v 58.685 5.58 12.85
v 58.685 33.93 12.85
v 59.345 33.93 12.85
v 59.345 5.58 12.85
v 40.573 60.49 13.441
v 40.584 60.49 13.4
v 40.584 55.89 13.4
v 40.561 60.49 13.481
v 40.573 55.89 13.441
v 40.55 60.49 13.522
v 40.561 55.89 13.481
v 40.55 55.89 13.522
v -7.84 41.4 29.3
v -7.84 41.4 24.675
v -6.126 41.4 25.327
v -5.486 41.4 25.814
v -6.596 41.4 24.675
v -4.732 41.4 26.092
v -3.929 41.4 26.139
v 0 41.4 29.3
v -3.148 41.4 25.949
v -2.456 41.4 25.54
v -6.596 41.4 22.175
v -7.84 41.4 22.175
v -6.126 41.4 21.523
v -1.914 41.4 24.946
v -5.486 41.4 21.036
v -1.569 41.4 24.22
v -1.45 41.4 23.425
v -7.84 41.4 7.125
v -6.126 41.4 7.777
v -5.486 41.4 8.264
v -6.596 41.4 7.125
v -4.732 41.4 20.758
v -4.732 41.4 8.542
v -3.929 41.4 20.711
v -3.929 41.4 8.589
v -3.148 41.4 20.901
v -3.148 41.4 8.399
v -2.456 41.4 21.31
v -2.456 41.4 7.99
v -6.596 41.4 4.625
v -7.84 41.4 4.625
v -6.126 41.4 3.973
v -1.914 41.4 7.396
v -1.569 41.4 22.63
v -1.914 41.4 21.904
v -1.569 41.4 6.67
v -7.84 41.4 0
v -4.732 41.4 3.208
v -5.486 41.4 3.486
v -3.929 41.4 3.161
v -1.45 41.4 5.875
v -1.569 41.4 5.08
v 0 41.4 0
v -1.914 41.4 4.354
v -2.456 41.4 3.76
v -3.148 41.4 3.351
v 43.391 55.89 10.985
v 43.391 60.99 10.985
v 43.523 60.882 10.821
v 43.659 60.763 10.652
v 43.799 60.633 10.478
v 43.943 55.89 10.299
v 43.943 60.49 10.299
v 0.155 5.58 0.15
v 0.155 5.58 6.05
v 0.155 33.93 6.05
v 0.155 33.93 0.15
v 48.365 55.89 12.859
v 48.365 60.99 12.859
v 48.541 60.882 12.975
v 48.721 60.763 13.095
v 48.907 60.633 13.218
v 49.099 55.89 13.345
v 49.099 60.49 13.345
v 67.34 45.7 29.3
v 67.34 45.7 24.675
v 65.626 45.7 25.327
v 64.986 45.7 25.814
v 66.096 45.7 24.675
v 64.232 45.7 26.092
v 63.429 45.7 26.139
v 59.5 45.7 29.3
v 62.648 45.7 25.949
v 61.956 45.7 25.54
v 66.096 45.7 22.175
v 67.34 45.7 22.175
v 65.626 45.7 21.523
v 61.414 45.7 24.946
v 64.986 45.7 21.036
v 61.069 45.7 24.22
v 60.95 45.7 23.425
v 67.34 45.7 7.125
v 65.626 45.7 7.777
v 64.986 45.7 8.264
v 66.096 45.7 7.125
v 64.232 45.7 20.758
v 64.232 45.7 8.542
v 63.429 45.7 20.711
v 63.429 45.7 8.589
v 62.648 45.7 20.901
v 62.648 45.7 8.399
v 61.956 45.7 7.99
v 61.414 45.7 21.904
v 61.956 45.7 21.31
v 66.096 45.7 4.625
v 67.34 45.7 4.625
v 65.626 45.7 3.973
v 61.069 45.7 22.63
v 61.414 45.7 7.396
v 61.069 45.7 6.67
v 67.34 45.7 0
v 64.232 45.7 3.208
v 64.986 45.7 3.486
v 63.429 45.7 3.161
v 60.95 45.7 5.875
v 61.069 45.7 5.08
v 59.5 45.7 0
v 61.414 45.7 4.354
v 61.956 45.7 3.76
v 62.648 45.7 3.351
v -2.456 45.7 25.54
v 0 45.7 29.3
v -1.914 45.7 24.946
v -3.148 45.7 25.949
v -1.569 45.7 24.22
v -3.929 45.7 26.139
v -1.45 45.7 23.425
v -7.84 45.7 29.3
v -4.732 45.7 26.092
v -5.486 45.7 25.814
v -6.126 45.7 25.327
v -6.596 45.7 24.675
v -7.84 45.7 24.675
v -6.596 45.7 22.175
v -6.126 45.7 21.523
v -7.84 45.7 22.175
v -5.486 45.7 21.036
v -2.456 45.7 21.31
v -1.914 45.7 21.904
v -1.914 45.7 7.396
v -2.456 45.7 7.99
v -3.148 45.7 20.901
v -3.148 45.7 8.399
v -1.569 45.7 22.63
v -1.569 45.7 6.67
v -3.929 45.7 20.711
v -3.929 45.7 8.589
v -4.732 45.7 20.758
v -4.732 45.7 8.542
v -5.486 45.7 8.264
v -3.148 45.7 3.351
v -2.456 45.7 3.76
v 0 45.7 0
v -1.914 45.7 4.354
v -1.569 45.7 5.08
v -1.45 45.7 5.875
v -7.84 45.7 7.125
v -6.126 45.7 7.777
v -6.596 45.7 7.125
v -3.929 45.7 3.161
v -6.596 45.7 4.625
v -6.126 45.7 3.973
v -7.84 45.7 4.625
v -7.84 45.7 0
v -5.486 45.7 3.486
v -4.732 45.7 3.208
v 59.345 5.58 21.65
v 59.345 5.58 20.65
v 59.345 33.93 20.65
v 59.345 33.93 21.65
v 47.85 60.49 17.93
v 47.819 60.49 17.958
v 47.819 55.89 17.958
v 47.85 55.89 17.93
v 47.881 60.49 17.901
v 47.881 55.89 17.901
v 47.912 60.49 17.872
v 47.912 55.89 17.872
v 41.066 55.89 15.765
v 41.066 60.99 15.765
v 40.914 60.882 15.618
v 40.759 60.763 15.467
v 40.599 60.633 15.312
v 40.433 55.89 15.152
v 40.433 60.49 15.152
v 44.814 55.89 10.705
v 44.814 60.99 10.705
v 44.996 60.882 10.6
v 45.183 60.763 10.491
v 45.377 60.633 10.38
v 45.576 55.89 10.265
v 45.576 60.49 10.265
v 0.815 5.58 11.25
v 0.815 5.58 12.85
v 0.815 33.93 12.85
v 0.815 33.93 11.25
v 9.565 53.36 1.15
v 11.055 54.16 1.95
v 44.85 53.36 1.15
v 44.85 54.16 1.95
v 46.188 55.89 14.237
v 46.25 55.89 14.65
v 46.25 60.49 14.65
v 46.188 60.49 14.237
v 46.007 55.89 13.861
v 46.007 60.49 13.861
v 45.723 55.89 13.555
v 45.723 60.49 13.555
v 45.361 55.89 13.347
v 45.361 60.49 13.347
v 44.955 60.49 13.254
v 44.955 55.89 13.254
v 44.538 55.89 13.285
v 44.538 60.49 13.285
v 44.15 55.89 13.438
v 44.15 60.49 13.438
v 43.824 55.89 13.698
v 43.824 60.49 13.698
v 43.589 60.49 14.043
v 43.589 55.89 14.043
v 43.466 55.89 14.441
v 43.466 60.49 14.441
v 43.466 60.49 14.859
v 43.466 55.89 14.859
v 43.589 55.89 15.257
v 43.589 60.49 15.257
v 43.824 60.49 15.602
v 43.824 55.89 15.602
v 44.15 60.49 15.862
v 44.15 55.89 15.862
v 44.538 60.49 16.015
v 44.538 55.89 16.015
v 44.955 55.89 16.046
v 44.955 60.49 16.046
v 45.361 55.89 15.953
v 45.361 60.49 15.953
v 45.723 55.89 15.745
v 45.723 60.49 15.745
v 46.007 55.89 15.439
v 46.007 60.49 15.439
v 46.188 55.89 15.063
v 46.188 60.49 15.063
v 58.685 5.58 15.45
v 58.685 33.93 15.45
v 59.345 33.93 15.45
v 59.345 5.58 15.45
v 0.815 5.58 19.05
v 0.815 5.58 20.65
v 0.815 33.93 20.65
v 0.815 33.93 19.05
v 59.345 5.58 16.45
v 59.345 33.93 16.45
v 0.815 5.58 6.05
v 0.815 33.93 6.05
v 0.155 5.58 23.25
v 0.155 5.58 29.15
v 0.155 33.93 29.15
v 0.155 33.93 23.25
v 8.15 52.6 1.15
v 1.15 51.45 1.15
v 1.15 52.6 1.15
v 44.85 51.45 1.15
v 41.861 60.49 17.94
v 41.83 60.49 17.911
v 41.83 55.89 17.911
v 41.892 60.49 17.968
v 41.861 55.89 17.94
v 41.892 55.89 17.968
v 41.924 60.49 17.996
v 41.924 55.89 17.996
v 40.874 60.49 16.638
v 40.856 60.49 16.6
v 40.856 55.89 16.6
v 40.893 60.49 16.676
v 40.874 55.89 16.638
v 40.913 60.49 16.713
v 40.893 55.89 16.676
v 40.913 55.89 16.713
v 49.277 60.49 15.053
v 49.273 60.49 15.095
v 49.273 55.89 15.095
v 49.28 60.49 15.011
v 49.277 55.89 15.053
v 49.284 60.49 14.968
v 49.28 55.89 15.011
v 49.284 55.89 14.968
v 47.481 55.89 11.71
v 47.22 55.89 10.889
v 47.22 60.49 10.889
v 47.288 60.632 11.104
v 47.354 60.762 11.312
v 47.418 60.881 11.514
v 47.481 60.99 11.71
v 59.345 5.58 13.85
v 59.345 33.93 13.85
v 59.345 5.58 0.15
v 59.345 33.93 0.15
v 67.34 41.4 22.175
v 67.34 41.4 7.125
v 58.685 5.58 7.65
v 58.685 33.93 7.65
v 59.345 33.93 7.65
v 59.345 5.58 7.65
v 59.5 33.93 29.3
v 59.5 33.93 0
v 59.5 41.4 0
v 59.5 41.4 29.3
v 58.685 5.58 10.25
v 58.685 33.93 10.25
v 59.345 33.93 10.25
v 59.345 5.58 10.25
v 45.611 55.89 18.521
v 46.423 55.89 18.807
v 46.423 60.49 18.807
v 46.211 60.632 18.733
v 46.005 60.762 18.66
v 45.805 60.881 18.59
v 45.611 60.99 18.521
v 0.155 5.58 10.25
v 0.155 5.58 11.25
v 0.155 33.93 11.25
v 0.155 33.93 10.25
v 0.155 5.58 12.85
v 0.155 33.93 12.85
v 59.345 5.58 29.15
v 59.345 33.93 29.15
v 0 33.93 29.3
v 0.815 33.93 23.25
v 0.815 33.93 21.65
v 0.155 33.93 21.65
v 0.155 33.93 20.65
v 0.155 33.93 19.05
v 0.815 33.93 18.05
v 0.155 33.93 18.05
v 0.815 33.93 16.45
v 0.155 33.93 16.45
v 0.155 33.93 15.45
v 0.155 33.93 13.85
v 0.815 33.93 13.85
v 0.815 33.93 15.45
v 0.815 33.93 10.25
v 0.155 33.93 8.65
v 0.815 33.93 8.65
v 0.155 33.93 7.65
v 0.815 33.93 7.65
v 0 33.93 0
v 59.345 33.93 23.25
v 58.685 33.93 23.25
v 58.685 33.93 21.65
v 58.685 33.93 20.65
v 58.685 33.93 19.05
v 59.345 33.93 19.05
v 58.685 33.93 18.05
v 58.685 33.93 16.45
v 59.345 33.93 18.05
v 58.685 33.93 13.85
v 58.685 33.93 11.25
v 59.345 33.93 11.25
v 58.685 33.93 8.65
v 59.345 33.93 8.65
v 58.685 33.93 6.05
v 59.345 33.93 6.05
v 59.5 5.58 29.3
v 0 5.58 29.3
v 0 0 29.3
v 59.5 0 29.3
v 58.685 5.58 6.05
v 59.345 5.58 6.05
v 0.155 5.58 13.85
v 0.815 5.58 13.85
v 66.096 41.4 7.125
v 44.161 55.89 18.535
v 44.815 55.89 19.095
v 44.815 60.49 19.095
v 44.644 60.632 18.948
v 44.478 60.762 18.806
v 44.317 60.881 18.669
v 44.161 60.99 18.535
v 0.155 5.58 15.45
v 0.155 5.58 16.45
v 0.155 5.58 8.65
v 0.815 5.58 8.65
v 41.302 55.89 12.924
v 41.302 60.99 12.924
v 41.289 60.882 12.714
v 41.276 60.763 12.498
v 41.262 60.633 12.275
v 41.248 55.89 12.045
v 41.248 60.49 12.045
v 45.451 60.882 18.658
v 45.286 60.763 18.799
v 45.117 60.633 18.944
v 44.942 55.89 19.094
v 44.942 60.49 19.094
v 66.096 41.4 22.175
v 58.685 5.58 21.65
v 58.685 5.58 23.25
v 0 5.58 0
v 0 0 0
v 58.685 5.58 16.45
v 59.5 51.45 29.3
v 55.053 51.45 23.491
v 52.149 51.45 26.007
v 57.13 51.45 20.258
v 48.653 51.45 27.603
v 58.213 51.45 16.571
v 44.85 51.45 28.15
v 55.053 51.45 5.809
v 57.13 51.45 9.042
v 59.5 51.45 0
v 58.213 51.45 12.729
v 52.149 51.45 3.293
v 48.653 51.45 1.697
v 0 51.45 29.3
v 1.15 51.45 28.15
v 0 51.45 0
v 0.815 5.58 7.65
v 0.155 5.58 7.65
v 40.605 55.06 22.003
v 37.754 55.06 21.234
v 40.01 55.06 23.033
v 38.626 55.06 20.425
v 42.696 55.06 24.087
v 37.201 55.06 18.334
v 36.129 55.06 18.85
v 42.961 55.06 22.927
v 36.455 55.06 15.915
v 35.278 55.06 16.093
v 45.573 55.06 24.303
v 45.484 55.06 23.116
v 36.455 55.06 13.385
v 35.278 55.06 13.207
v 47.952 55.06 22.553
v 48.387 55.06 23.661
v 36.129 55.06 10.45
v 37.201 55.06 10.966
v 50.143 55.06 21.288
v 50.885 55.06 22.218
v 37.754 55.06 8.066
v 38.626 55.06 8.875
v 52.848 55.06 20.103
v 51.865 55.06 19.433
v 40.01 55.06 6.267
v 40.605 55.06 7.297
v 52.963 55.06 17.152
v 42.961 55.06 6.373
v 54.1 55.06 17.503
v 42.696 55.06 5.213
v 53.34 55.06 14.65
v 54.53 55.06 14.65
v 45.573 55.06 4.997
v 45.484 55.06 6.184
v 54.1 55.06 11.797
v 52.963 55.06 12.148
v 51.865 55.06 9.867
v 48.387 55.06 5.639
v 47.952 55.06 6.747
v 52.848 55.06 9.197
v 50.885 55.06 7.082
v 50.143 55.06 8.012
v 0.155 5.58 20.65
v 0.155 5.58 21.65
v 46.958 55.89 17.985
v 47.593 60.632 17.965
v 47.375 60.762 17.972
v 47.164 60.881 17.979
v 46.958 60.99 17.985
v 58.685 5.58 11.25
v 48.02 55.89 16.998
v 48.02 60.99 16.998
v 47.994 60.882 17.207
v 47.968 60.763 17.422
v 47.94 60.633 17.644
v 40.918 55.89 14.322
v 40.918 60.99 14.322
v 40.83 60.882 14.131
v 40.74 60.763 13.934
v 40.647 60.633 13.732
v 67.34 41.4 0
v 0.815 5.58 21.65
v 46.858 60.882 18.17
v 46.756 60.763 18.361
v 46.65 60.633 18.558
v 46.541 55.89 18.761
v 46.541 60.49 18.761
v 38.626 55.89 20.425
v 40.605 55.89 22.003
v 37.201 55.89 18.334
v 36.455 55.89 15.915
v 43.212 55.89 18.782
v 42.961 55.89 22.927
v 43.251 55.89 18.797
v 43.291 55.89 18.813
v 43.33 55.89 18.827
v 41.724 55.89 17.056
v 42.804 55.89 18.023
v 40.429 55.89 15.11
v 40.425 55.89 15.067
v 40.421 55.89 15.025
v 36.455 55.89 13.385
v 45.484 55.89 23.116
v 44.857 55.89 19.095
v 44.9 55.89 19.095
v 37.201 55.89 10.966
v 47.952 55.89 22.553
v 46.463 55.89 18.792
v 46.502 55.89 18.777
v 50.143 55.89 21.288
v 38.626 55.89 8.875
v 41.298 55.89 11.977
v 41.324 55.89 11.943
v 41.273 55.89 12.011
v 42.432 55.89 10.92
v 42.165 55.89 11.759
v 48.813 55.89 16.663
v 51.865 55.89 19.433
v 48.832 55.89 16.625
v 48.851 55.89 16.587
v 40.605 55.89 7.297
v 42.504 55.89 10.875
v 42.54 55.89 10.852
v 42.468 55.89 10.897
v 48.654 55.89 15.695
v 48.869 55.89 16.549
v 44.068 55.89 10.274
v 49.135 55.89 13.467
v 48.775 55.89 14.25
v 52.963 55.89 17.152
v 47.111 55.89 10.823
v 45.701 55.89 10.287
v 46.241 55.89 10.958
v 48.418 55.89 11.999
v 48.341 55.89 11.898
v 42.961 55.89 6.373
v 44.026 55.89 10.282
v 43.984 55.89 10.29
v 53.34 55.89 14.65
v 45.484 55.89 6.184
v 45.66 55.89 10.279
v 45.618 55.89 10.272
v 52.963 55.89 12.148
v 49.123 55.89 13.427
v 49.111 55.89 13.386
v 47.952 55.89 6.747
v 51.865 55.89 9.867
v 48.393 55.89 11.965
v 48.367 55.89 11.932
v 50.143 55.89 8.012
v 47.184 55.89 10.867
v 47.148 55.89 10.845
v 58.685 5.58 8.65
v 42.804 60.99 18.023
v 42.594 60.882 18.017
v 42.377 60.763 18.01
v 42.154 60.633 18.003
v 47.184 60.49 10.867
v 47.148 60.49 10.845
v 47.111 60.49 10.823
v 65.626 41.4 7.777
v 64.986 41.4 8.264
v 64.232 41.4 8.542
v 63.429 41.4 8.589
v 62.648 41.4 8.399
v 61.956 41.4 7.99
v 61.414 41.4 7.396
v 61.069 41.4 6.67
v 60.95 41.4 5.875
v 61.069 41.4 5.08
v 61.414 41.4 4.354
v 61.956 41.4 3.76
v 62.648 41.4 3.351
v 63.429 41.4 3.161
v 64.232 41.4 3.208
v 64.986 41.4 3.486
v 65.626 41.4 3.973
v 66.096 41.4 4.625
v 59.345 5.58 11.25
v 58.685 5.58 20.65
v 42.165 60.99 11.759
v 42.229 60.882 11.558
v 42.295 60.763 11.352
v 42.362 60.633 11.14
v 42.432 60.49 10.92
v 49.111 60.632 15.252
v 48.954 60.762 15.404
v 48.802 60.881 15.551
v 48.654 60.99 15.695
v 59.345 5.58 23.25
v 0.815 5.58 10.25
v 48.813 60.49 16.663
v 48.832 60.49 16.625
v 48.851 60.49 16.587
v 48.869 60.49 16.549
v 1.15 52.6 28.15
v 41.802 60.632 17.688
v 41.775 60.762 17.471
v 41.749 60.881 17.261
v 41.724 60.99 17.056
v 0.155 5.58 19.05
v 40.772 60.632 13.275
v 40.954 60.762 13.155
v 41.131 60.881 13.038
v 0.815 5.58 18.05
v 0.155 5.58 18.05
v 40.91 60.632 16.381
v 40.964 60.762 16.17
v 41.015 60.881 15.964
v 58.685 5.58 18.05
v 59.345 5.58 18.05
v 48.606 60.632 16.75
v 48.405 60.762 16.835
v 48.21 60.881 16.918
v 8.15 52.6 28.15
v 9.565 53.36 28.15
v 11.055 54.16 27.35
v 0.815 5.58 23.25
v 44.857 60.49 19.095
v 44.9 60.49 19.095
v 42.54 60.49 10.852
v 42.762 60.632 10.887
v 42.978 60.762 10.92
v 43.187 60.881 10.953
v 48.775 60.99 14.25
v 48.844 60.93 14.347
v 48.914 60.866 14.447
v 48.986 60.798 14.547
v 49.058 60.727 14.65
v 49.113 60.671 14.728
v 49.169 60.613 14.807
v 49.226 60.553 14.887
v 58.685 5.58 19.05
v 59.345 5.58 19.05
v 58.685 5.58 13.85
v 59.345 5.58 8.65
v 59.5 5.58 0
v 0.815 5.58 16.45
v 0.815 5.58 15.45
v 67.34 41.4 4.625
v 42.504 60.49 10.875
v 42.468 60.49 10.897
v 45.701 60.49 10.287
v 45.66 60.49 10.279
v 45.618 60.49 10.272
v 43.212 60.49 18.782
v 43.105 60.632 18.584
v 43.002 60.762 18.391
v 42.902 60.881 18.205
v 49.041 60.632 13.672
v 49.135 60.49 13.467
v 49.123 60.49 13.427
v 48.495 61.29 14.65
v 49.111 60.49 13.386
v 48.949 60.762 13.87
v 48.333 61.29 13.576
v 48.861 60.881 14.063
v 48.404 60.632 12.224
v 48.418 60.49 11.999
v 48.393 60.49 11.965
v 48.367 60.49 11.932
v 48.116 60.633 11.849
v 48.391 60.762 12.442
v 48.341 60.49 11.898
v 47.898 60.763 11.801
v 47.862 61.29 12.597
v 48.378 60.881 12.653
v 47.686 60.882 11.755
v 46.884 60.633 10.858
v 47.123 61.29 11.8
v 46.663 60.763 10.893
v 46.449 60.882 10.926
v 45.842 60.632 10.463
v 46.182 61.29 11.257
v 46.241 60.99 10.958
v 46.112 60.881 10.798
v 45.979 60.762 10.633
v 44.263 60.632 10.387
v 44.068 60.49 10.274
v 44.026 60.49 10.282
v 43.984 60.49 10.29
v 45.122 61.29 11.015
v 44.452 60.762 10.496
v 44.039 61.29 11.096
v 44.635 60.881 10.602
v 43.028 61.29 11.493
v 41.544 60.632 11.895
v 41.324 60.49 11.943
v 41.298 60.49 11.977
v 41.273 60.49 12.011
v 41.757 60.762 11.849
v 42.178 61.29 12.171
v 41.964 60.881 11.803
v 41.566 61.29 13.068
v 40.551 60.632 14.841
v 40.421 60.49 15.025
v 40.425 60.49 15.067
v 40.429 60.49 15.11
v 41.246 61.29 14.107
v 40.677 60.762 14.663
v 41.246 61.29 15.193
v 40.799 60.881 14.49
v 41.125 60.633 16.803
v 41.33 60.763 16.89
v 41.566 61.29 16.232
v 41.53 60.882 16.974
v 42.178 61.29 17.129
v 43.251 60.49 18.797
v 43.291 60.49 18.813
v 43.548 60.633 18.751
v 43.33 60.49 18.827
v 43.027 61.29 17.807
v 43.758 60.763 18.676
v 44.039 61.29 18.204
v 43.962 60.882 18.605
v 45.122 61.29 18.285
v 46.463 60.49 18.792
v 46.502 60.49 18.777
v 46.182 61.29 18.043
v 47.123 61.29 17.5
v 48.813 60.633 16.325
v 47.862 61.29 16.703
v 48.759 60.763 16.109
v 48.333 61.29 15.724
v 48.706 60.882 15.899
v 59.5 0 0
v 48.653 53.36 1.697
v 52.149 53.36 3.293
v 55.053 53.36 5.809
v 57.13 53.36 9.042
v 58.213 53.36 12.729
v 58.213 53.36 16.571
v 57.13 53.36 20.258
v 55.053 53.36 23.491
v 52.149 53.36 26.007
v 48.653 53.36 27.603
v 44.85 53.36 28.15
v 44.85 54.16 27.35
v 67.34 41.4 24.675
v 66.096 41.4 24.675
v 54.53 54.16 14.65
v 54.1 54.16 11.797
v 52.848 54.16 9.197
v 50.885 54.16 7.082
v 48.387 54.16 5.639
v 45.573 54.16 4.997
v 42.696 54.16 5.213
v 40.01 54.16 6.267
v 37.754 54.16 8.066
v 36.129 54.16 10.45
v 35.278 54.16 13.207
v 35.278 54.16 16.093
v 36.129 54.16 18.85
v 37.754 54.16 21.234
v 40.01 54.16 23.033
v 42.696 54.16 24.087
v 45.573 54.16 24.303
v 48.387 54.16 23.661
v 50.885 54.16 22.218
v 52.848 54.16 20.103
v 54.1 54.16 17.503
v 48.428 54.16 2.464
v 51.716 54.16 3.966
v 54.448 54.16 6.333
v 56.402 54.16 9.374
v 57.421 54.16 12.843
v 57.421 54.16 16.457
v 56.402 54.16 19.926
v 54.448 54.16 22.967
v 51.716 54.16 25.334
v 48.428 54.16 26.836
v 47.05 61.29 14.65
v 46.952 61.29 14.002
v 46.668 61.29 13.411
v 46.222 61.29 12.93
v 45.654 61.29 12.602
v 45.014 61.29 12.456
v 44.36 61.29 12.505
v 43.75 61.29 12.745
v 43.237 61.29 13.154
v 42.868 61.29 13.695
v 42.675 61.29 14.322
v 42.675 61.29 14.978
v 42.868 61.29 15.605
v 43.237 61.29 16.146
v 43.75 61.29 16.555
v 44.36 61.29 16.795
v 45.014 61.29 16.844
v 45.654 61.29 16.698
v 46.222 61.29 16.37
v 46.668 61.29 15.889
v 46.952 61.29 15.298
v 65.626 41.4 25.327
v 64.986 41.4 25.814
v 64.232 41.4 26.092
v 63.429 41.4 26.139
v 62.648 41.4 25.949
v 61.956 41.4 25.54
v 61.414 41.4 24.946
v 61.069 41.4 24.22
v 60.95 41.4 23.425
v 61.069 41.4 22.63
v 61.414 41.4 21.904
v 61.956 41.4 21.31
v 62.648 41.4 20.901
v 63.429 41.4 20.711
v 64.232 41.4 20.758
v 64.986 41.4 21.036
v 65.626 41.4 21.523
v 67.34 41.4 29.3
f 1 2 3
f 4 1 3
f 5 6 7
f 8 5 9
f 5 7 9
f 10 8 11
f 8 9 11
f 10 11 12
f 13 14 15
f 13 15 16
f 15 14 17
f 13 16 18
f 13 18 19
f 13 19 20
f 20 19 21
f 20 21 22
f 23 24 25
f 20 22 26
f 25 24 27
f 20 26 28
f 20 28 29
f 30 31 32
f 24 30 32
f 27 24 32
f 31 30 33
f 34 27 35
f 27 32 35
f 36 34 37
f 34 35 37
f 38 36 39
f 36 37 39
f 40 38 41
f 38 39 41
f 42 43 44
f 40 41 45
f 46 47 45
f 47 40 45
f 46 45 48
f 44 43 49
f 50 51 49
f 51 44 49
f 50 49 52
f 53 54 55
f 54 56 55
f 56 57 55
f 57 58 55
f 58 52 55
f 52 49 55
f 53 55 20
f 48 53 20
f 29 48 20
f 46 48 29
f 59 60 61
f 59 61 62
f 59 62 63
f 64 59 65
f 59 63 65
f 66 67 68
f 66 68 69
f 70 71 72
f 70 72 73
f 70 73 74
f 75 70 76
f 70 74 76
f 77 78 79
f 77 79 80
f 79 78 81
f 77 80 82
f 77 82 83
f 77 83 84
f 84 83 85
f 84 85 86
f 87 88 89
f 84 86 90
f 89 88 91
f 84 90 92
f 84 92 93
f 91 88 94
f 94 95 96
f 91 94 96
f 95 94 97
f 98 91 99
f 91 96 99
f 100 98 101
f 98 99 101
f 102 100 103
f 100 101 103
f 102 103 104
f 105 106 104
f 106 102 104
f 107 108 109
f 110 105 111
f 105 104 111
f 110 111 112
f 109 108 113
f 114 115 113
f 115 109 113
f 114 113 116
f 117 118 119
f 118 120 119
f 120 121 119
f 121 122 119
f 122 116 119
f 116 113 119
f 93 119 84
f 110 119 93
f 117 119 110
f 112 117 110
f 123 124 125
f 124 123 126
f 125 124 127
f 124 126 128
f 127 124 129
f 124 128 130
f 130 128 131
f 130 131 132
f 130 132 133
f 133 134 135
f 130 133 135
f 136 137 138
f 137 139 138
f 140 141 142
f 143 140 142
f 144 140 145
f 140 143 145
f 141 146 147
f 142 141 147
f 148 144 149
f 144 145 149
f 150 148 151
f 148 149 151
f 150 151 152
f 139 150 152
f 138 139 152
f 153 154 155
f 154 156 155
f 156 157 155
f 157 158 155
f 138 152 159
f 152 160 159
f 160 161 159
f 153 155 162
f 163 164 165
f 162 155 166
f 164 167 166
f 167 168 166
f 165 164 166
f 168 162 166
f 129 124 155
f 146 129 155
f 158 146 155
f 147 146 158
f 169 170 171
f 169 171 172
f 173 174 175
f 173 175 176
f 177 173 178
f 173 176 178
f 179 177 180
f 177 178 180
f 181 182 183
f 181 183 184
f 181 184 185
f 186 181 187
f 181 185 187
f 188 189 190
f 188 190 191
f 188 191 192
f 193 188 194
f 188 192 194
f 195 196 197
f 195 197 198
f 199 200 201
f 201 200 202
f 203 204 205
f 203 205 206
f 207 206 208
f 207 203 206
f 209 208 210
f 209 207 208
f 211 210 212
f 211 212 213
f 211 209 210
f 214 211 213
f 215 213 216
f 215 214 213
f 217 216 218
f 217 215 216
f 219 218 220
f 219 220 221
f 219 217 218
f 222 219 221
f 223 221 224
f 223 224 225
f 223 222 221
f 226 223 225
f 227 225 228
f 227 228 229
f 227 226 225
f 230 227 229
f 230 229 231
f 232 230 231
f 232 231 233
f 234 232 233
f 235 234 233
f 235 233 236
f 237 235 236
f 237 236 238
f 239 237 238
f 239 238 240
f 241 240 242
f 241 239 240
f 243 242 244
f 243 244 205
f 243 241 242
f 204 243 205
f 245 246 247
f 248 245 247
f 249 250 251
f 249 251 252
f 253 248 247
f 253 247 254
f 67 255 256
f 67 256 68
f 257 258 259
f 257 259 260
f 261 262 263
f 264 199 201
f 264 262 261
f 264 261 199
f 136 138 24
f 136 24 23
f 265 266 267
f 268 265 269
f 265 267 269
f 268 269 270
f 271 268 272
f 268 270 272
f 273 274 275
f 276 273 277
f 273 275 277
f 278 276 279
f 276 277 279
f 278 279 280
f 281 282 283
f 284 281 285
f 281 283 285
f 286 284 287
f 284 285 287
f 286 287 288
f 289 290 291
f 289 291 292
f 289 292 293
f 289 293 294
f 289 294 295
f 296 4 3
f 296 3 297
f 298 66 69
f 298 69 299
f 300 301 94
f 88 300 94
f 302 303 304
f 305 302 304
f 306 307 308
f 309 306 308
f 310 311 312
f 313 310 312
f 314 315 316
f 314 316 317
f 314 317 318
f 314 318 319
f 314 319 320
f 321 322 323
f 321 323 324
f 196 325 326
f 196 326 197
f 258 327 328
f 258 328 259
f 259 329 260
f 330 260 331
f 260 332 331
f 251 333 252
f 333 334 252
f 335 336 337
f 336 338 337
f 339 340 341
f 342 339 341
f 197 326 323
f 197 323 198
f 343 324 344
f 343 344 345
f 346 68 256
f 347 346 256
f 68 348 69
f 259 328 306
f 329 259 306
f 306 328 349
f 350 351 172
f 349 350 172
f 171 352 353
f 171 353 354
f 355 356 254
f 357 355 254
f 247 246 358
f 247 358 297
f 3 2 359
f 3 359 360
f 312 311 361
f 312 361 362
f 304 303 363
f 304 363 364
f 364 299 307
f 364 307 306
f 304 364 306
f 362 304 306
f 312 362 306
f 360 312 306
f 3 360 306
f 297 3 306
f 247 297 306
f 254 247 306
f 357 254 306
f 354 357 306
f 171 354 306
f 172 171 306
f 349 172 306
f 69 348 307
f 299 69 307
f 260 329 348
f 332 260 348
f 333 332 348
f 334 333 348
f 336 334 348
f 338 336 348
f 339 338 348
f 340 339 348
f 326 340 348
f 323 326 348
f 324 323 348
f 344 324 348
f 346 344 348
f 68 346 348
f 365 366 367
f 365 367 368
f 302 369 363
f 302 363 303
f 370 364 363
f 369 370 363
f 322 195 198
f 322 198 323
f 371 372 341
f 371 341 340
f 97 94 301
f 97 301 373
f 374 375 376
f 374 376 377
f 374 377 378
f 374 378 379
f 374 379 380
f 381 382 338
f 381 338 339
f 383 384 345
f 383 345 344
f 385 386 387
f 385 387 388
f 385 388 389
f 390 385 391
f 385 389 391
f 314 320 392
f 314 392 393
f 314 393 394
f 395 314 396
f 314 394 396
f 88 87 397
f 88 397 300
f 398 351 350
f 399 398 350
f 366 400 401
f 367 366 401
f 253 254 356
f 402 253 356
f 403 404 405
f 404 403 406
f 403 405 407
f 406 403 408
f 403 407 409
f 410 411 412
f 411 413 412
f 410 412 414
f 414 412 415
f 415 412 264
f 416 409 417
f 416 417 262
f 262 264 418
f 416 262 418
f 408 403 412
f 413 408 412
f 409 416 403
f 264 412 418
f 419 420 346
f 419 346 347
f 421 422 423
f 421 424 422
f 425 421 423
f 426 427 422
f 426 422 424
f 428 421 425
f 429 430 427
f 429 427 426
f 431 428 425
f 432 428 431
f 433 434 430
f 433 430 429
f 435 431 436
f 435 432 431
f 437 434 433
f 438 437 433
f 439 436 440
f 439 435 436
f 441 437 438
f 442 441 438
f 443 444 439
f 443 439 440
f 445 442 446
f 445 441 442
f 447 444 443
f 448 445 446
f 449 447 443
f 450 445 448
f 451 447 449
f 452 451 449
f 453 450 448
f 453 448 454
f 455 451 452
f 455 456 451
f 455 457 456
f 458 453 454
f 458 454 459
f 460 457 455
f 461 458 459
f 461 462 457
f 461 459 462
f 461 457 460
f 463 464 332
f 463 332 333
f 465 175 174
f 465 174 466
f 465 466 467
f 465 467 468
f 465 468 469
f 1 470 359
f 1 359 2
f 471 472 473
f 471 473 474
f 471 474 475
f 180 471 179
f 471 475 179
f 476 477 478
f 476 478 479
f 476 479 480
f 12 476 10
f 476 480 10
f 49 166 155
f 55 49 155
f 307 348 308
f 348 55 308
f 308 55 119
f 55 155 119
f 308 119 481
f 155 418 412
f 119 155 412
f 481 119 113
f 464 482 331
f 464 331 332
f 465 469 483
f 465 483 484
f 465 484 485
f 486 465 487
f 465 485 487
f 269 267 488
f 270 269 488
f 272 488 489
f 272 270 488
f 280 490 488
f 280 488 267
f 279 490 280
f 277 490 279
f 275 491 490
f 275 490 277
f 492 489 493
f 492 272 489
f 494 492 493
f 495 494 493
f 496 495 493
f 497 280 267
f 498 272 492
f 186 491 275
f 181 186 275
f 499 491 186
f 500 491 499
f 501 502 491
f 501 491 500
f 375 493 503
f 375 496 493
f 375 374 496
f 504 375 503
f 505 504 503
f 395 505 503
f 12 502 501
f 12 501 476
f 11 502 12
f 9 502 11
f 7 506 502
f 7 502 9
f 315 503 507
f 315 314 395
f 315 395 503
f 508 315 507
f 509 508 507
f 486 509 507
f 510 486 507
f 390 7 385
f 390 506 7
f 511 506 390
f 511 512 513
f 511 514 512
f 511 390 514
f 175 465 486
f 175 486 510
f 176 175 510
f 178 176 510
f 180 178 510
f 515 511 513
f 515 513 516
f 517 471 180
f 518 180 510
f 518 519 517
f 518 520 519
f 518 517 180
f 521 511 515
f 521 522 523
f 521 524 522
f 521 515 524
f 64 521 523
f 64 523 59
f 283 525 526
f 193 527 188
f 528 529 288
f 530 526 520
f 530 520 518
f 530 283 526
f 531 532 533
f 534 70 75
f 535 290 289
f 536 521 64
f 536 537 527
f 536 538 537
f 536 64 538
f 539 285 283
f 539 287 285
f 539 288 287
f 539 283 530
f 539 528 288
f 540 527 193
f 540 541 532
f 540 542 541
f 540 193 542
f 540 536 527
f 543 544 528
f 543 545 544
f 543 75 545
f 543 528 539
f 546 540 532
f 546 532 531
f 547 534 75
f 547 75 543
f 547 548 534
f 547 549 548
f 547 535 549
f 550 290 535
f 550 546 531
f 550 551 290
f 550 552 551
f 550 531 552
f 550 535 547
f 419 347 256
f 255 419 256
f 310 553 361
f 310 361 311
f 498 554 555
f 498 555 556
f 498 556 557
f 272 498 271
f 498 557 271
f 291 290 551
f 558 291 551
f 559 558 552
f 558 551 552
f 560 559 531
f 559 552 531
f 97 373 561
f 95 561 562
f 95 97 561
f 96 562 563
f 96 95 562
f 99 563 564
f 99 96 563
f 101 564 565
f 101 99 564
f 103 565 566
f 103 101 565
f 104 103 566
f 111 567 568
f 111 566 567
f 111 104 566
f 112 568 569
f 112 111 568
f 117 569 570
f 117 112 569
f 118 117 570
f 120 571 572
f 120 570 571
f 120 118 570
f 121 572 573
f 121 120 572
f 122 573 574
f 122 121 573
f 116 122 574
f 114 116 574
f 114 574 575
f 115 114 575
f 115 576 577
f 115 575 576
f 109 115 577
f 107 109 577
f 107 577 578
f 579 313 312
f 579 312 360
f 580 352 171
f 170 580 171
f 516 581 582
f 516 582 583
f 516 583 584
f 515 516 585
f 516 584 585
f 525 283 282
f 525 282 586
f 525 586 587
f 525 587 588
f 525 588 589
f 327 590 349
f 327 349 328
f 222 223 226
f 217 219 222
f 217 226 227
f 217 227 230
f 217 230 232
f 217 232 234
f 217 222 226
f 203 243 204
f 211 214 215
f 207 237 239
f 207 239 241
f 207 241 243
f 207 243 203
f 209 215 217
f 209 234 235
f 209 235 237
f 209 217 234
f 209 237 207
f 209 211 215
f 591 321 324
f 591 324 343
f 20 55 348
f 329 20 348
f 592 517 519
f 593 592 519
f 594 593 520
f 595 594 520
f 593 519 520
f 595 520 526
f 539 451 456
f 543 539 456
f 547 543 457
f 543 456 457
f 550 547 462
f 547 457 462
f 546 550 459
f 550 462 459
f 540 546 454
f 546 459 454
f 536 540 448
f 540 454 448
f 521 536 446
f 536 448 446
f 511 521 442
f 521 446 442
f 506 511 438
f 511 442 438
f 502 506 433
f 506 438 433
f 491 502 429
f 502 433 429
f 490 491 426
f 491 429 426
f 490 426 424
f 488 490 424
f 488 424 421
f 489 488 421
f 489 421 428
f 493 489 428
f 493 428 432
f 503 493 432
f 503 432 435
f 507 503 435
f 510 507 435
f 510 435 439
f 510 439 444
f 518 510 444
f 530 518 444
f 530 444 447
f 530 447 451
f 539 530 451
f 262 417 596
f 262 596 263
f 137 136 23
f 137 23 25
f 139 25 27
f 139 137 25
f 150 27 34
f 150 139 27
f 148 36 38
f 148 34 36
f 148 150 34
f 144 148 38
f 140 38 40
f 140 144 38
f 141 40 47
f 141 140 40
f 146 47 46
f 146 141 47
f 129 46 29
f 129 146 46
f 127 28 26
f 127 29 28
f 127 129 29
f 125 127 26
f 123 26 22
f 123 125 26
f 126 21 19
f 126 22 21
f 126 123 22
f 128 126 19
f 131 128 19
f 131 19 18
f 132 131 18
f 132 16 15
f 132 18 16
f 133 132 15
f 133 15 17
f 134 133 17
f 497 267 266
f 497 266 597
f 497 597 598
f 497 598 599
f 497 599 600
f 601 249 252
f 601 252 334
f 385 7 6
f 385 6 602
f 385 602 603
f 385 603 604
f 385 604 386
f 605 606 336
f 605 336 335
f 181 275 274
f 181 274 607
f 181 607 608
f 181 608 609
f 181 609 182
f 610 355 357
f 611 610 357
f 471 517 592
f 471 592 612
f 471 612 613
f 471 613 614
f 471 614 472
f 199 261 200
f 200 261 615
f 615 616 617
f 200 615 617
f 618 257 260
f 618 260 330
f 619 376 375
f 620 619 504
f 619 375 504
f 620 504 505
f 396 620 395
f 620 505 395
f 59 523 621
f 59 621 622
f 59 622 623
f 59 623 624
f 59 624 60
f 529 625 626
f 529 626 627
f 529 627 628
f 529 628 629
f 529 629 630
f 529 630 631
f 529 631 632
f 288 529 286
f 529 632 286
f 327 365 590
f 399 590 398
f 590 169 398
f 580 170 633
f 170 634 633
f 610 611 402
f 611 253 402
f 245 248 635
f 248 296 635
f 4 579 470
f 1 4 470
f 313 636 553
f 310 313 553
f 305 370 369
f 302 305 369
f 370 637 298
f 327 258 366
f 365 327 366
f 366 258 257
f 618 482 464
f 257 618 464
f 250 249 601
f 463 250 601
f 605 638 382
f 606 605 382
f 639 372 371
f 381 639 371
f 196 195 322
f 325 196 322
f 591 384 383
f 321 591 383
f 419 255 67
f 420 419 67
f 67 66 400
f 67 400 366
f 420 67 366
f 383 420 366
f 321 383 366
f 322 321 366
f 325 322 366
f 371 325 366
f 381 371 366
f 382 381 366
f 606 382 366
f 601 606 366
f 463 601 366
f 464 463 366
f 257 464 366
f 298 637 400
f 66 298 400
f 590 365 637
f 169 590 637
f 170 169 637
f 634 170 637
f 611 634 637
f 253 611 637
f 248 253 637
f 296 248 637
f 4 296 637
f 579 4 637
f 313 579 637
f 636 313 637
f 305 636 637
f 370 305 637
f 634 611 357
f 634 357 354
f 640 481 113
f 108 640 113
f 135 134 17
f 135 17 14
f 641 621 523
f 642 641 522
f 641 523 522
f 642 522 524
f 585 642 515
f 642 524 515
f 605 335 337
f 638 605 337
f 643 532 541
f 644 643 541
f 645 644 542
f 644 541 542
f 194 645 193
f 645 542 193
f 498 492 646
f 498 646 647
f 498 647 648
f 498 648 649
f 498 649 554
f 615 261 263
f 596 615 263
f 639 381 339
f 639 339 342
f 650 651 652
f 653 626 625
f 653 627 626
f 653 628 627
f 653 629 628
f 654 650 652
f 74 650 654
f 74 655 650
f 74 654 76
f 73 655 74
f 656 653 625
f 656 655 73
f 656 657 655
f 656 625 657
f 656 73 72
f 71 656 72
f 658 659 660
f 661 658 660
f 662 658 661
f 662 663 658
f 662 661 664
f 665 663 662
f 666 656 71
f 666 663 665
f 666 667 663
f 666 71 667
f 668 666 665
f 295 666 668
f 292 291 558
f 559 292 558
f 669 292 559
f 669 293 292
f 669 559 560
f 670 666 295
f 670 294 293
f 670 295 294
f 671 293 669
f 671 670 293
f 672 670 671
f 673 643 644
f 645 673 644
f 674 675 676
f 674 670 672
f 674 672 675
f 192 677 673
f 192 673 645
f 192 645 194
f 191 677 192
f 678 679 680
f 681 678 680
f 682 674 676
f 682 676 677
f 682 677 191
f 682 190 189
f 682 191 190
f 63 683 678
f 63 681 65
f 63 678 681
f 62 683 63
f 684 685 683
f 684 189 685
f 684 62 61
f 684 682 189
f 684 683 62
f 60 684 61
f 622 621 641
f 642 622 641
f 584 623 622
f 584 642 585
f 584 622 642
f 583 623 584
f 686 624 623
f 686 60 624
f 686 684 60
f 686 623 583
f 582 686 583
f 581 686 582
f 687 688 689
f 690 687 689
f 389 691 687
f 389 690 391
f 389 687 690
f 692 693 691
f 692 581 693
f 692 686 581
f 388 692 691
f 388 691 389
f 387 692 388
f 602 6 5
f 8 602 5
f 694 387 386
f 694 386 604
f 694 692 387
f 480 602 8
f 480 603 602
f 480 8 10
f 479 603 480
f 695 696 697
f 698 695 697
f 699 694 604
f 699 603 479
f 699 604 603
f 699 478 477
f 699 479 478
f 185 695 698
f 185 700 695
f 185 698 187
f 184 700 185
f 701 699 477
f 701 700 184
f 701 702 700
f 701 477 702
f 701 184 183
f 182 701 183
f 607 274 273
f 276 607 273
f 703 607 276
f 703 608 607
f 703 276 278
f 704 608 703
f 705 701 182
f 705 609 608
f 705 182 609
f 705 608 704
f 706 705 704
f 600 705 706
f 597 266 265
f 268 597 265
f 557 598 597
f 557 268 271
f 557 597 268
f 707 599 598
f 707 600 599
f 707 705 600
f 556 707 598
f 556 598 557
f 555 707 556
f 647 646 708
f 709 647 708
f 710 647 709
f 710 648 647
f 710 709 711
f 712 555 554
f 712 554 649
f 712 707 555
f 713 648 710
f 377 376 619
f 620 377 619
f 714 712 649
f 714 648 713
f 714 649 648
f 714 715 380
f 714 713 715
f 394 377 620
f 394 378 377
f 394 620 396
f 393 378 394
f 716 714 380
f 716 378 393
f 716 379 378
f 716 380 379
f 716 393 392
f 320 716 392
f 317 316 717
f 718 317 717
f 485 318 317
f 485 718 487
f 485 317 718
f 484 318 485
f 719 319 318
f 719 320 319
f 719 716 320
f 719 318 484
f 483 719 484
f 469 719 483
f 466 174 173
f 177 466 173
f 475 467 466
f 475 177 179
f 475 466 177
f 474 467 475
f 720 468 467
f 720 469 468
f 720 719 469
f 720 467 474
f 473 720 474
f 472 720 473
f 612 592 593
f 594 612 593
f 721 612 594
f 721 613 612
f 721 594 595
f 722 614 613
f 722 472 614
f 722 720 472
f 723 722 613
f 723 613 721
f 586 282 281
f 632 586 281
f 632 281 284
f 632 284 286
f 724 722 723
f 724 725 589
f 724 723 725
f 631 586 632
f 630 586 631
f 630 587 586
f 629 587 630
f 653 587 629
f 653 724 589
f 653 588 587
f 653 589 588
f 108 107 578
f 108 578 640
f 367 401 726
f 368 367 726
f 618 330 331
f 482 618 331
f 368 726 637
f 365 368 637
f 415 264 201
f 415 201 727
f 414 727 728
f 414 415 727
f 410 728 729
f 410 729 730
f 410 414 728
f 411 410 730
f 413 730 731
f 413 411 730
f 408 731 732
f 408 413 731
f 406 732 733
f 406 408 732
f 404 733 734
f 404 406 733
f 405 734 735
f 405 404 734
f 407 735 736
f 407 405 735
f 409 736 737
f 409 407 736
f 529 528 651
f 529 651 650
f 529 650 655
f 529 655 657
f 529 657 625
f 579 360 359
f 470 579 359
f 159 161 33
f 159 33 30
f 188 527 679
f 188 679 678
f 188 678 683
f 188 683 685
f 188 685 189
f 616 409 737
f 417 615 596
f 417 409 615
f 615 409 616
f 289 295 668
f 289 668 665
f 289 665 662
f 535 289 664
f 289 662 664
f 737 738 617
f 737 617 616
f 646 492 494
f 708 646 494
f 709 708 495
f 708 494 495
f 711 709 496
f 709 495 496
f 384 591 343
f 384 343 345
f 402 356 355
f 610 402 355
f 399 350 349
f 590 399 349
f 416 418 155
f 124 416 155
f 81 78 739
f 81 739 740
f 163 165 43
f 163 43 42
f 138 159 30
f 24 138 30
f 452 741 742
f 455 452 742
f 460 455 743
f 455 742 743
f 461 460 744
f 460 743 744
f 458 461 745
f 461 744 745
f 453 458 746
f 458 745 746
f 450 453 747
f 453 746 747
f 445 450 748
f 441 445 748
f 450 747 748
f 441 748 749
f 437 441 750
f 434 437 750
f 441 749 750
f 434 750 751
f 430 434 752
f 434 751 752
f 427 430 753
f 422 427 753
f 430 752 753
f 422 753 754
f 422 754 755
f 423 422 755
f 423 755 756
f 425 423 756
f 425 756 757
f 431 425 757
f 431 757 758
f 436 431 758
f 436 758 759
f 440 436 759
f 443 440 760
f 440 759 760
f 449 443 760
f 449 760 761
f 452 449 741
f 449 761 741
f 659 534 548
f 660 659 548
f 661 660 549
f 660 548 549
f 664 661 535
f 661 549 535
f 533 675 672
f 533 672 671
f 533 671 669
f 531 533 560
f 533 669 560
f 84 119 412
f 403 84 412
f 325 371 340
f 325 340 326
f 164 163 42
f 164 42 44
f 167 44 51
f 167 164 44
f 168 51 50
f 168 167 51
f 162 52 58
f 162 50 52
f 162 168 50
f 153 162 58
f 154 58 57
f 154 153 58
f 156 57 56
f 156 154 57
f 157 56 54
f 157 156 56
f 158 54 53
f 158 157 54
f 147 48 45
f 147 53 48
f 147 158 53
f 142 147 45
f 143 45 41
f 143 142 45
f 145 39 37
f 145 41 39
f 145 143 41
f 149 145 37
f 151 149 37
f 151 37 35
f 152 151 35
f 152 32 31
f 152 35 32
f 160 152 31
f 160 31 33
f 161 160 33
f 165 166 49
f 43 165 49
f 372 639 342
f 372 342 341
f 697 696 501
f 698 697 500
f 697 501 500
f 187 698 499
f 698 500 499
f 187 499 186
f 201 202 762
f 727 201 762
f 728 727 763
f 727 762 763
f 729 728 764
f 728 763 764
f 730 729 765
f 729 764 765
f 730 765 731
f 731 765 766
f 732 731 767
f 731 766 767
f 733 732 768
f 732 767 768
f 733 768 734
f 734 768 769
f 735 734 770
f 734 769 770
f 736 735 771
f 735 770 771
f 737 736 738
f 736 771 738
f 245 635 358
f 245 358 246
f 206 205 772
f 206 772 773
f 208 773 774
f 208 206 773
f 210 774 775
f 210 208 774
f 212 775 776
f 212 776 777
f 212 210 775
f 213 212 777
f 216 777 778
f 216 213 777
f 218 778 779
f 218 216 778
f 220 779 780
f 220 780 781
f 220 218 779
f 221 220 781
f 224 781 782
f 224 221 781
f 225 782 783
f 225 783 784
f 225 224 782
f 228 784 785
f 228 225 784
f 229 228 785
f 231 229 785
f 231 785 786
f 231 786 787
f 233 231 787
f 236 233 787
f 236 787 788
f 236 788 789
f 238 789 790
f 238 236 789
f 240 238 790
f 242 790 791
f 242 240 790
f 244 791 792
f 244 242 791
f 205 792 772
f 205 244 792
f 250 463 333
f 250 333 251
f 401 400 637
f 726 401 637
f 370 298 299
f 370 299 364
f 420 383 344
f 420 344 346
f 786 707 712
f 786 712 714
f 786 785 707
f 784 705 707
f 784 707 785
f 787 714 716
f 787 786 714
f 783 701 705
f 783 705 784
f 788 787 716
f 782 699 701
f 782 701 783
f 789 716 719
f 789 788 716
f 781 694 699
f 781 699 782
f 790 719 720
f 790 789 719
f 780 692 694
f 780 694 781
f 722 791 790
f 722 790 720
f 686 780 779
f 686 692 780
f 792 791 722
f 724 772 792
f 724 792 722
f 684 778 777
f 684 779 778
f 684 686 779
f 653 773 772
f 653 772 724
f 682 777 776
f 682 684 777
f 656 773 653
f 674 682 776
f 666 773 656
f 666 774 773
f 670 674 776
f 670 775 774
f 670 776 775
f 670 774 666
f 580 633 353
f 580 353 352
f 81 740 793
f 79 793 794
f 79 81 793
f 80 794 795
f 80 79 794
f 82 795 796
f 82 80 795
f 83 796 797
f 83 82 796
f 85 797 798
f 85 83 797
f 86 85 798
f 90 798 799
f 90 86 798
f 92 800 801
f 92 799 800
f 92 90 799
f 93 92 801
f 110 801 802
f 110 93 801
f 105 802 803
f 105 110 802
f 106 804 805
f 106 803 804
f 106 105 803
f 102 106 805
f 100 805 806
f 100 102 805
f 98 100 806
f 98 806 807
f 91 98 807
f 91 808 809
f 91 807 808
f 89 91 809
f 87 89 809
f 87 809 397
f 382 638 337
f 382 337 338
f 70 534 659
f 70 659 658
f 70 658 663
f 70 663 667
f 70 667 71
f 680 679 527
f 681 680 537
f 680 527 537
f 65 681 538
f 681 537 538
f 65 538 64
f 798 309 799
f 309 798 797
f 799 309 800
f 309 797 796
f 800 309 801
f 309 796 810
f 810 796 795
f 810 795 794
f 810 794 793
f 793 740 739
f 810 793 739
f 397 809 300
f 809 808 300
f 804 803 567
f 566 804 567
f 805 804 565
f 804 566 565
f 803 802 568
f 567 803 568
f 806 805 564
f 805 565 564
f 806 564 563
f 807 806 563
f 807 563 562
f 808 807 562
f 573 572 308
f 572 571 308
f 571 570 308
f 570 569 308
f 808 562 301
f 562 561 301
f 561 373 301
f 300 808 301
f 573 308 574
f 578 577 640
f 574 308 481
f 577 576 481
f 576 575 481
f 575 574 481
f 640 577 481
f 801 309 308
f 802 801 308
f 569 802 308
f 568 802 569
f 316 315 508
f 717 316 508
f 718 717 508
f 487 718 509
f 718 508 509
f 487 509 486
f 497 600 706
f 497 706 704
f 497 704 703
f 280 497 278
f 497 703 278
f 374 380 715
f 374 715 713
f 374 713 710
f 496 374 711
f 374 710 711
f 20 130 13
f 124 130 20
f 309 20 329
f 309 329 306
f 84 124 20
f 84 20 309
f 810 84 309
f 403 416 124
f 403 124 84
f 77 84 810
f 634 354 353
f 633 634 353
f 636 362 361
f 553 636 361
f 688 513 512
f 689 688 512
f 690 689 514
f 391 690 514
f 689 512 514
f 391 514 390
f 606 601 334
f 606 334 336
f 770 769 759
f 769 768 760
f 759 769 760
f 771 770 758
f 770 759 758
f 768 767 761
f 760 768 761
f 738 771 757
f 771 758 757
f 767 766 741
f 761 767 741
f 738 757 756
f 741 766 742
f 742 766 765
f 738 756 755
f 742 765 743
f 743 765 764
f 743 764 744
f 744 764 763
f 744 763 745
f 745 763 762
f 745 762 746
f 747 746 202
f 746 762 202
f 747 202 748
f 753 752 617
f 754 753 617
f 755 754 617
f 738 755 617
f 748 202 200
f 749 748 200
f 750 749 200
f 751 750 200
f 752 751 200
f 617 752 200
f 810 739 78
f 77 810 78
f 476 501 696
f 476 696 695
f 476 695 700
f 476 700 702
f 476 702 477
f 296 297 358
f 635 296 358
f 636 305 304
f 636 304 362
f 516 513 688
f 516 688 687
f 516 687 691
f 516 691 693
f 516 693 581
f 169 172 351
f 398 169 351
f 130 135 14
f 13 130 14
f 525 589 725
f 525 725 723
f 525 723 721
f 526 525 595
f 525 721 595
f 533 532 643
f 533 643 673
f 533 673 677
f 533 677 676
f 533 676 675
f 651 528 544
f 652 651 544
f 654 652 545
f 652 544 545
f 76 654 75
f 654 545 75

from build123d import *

# Parameters (mm, degrees)
SALIENTE_EXTRUIR1_DEPTH = 29.3
CROQUIS2_W              = 85.211346073
CROQUIS2_H              = 50.160748779
CORTAR_EXTRUIR1_DEPTH   = 28.35
CORTAR_EXTRUIR2_REACH   = 47.7
SALIENTE_EXTRUIR2_DEPTH = 1.15
SALIENTE_EXTRUIR3_DEPTH = 1.56
CHAFL_N1_SIZE           = 0.8
CORTAR_EXTRUIR3_DEPTH   = 30.3
CROQUIS7_R              = 9.68
SALIENTE_EXTRUIR4_DEPTH = 0.9
CROQUIS8_R              = 8.49
SALIENTE_EXTRUIR5_DEPTH = 0.83
CROQUIS9_R              = 4.445
CROQUIS9_R_2            = 1.4
SALIENTE_EXTRUIR6_DEPTH = 5.4
CHAFL_N2_SIZE           = 0.8
CORTAR_EXTRUIR4_DEPTH   = 5.4
MATRIZC1_COUNT          = 17


with BuildPart() as part:
    # Croquis1 → Saliente-Extruir1 (new body)
    with BuildSketch(Plane.XY):
        Polygon((0, 0), (59.5, 0), (59.5, 5.58), (59.355, 5.58), (59.355, 33.93), (59.5, 33.93), (59.5, 41.4), (67.34, 41.4), (67.34, 45.7), (59.5, 45.7), (59.5, 51.45), (0, 51.45), (0, 45.7), (-7.84, 45.7), (-7.84, 41.4), (0, 41.4), (0, 33.93), (0.145, 33.93), (0.145, 5.58), (0, 5.58), align=None)
    extrude(amount=SALIENTE_EXTRUIR1_DEPTH)

    # Croquis2 → Cortar-Extruir1 (cut)
    with BuildSketch(Plane(origin=(0, 5.58, 0), x_dir=(1, 0, 0), z_dir=(0, 1, 0))):
        with Locations((30.740829606, -17.065147164)):
            Rectangle(CROQUIS2_W, CROQUIS2_H)
        Polygon((0.155, -0.15), (59.345, -0.15), (59.345, -6.05), (58.685, -6.05), (58.685, -7.65), (59.345, -7.65), (59.345, -8.65), (58.685, -8.65), (58.685, -10.25), (59.345, -10.25), (59.345, -11.25), (58.685, -11.25), (58.685, -12.85), (59.345, -12.85), (59.345, -13.85), (58.685, -13.85), (58.685, -15.45), (59.345, -15.45), (59.345, -16.45), (58.685, -16.45), (58.685, -18.05), (59.345, -18.05), (59.345, -19.05), (58.685, -19.05), (58.685, -20.65), (59.345, -20.65), (59.345, -21.65), (58.685, -21.65), (58.685, -23.25), (59.345, -23.25), (59.345, -29.15), (0.155, -29.15), (0.155, -23.25), (0.815, -23.25), (0.815, -21.65), (0.155, -21.65), (0.155, -20.65), (0.815, -20.65), (0.815, -19.05), (0.155, -19.05), (0.155, -18.05), (0.815, -18.05), (0.815, -16.45), (0.155, -16.45), (0.155, -15.45), (0.815, -15.45), (0.815, -13.85), (0.155, -13.85), (0.155, -12.85), (0.815, -12.85), (0.815, -11.25), (0.155, -11.25), (0.155, -10.25), (0.815, -10.25), (0.815, -8.65), (0.155, -8.65), (0.155, -7.65), (0.815, -7.65), (0.815, -6.05), (0.155, -6.05), align=None, mode=Mode.SUBTRACT)
    extrude(amount=CORTAR_EXTRUIR1_DEPTH, mode=Mode.SUBTRACT)

    # Croquis3 → Cortar-Extruir2 (cut, up to next)
    with BuildSketch(Plane(origin=(0, 45.7, 0), x_dir=(1, 0, 0), z_dir=(0, 1, 0)), mode=Mode.PRIVATE) as cortar_extruir2_sk1:
        with BuildLine():
            Line((-8.62807943, -4.625), (-6.596389064, -4.625))
            ThreePointArc((-6.596389064, -4.625), (-1.45, -5.875), (-6.596389064, -7.125))
            Line((-6.596389064, -7.125), (-8.62807943, -7.125))
            Line((-8.62807943, -7.125), (-8.62807943, -4.625))
        make_face()
    cortar_extruir2_tool1 = extrude(cortar_extruir2_sk1.sketch, amount=-CORTAR_EXTRUIR2_REACH, mode=Mode.PRIVATE) & part.part
    add(cortar_extruir2_tool1.solids().sort_by_distance((-4.754174, 45.7, 5.875))[0], mode=Mode.SUBTRACT)
    # Croquis3 → Cortar-Extruir2 (cut, up to next)
    with BuildSketch(Plane(origin=(0, 45.7, 0), x_dir=(1, 0, 0), z_dir=(0, 1, 0)), mode=Mode.PRIVATE) as cortar_extruir2_sk2:
        with BuildLine():
            Line((68.12807943, -7.125), (66.096389064, -7.125))
            ThreePointArc((66.096389064, -7.125), (60.95, -5.875), (66.096389064, -4.625))
            Line((66.096389064, -4.625), (68.12807943, -4.625))
            Line((68.12807943, -4.625), (68.12807943, -7.125))
        make_face()
    cortar_extruir2_tool2 = extrude(cortar_extruir2_sk2.sketch, amount=-CORTAR_EXTRUIR2_REACH, mode=Mode.PRIVATE) & part.part
    add(cortar_extruir2_tool2.solids().sort_by_distance((64.254174, 45.7, 5.875))[0], mode=Mode.SUBTRACT)
    # Croquis3 → Cortar-Extruir2 (cut, up to next)
    with BuildSketch(Plane(origin=(0, 45.7, 0), x_dir=(1, 0, 0), z_dir=(0, 1, 0)), mode=Mode.PRIVATE) as cortar_extruir2_sk3:
        with BuildLine():
            Line((68.12807943, -24.675), (66.096389064, -24.675))
            ThreePointArc((66.096389064, -24.675), (60.95, -23.425), (66.096389064, -22.175))
            Line((66.096389064, -22.175), (68.12807943, -22.175))
            Line((68.12807943, -22.175), (68.12807943, -24.675))
        make_face()
    cortar_extruir2_tool3 = extrude(cortar_extruir2_sk3.sketch, amount=-CORTAR_EXTRUIR2_REACH, mode=Mode.PRIVATE) & part.part
    add(cortar_extruir2_tool3.solids().sort_by_distance((64.254174, 45.7, 23.425))[0], mode=Mode.SUBTRACT)
    # Croquis3 → Cortar-Extruir2 (cut, up to next)
    with BuildSketch(Plane(origin=(0, 45.7, 0), x_dir=(1, 0, 0), z_dir=(0, 1, 0)), mode=Mode.PRIVATE) as cortar_extruir2_sk4:
        with BuildLine():
            Line((-8.62807943, -22.175), (-6.596389064, -22.175))
            ThreePointArc((-6.596389064, -22.175), (-1.45, -23.425), (-6.596389064, -24.675))
            Line((-6.596389064, -24.675), (-8.62807943, -24.675))
            Line((-8.62807943, -24.675), (-8.62807943, -22.175))
        make_face()
    cortar_extruir2_tool4 = extrude(cortar_extruir2_sk4.sketch, amount=-CORTAR_EXTRUIR2_REACH, mode=Mode.PRIVATE) & part.part
    add(cortar_extruir2_tool4.solids().sort_by_distance((-4.754174, 45.7, 23.425))[0], mode=Mode.SUBTRACT)

    # Croquis4 → Saliente-Extruir2 (add)
    with BuildSketch(Plane(origin=(0, 51.45, 0), x_dir=(1, 0, 0), z_dir=(0, 1, 0))):
        with BuildLine():
            Line((1.15, -1.15), (44.85, -1.15))
            ThreePointArc((44.85, -1.15), (58.35, -14.65), (44.85, -28.15))
            Line((44.85, -28.15), (1.15, -28.15))
            Line((1.15, -28.15), (1.15, -1.15))
        make_face()
    extrude(amount=SALIENTE_EXTRUIR2_DEPTH)

    # Croquis5 → Saliente-Extruir3 (add)
    with BuildSketch(Plane(origin=(0, 52.6, 0), x_dir=(1, 0, 0), z_dir=(0, 1, 0))):
        with BuildLine():
            Line((8.15, -1.15), (44.85, -1.15))
            ThreePointArc((44.85, -1.15), (58.35, -14.65), (44.85, -28.15))
            Line((44.85, -28.15), (8.15, -28.15))
            Line((8.15, -28.15), (8.15, -1.15))
        make_face()
    extrude(amount=SALIENTE_EXTRUIR3_DEPTH)

    # Chaflán1
    chafl_n1_edges = [part.edges().sort_by_distance(p)[0] for p in [
        (26.5, 54.16, 1.15),
        (58.35, 54.16, 14.65),
        (26.5, 54.16, 28.15),
        (8.15, 54.16, 14.65),
    ]]
    chamfer(chafl_n1_edges, length=CHAFL_N1_SIZE)

    # Croquis6 → Cortar-Extruir3 (cut, through all)
    with BuildSketch(Plane.XY.offset(29.3)):
        Polygon((-14.418501218, 52.6), (8.15, 52.6), (21.570974014, 59.807560118), align=None)
    extrude(amount=-CORTAR_EXTRUIR3_DEPTH, mode=Mode.SUBTRACT)

    # Croquis7 → Saliente-Extruir4 (add)
    with BuildSketch(Plane(origin=(0, 54.16, 0), x_dir=(1, 0, 0), z_dir=(0, 1, 0))):
        with Locations((44.85, -14.65)):
            Circle(CROQUIS7_R)
    extrude(amount=SALIENTE_EXTRUIR4_DEPTH)

    # Croquis8 → Saliente-Extruir5 (add)
    with BuildSketch(Plane(origin=(0, 55.06, 0), x_dir=(1, 0, 0), z_dir=(0, 1, 0))):
        with Locations((44.85, -14.65)):
            Circle(CROQUIS8_R)
    extrude(amount=SALIENTE_EXTRUIR5_DEPTH)

    # Croquis9 → Saliente-Extruir6 (add)
    with BuildSketch(Plane(origin=(0, 55.89, 0), x_dir=(1, 0, 0), z_dir=(0, 1, 0))):
        with Locations((44.85, -14.65)):
            Circle(CROQUIS9_R)
        with Locations((44.85, -14.65)):
            Circle(CROQUIS9_R_2, mode=Mode.SUBTRACT)
    extrude(amount=SALIENTE_EXTRUIR6_DEPTH)

    # Chaflán2
    chafl_n2_edges = [part.edges().sort_by_distance(p)[0] for p in [
        (40.405, 61.29, 14.65),
        (43.45, 61.29, 14.65),
    ]]
    chamfer(chafl_n2_edges, length=CHAFL_N2_SIZE)

    # Croquis10 → Cortar-Extruir4 (cut)
    with BuildSketch(Plane(origin=(0, 61.29, 0), x_dir=(1, 0, 0), z_dir=(0, 1, 0))):
        Polygon((37.454169613, -6.456059857), (44.813549818, -10.705), (52.172930023, -6.456059857), align=None)
    cortar_extruir4 = extrude(amount=-CORTAR_EXTRUIR4_DEPTH, mode=Mode.SUBTRACT)

    # MatrizC1: Cortar-Extruir4 ×17 about axis
    matrizc1_axis = Axis((44.85, 0, 14.65), (0, 1, 0))
    for i in range(1, MATRIZC1_COUNT):
        add(cortar_extruir4.rotate(matrizc1_axis, i * 360 / MATRIZC1_COUNT), mode=Mode.SUBTRACT)


solid = part.part
